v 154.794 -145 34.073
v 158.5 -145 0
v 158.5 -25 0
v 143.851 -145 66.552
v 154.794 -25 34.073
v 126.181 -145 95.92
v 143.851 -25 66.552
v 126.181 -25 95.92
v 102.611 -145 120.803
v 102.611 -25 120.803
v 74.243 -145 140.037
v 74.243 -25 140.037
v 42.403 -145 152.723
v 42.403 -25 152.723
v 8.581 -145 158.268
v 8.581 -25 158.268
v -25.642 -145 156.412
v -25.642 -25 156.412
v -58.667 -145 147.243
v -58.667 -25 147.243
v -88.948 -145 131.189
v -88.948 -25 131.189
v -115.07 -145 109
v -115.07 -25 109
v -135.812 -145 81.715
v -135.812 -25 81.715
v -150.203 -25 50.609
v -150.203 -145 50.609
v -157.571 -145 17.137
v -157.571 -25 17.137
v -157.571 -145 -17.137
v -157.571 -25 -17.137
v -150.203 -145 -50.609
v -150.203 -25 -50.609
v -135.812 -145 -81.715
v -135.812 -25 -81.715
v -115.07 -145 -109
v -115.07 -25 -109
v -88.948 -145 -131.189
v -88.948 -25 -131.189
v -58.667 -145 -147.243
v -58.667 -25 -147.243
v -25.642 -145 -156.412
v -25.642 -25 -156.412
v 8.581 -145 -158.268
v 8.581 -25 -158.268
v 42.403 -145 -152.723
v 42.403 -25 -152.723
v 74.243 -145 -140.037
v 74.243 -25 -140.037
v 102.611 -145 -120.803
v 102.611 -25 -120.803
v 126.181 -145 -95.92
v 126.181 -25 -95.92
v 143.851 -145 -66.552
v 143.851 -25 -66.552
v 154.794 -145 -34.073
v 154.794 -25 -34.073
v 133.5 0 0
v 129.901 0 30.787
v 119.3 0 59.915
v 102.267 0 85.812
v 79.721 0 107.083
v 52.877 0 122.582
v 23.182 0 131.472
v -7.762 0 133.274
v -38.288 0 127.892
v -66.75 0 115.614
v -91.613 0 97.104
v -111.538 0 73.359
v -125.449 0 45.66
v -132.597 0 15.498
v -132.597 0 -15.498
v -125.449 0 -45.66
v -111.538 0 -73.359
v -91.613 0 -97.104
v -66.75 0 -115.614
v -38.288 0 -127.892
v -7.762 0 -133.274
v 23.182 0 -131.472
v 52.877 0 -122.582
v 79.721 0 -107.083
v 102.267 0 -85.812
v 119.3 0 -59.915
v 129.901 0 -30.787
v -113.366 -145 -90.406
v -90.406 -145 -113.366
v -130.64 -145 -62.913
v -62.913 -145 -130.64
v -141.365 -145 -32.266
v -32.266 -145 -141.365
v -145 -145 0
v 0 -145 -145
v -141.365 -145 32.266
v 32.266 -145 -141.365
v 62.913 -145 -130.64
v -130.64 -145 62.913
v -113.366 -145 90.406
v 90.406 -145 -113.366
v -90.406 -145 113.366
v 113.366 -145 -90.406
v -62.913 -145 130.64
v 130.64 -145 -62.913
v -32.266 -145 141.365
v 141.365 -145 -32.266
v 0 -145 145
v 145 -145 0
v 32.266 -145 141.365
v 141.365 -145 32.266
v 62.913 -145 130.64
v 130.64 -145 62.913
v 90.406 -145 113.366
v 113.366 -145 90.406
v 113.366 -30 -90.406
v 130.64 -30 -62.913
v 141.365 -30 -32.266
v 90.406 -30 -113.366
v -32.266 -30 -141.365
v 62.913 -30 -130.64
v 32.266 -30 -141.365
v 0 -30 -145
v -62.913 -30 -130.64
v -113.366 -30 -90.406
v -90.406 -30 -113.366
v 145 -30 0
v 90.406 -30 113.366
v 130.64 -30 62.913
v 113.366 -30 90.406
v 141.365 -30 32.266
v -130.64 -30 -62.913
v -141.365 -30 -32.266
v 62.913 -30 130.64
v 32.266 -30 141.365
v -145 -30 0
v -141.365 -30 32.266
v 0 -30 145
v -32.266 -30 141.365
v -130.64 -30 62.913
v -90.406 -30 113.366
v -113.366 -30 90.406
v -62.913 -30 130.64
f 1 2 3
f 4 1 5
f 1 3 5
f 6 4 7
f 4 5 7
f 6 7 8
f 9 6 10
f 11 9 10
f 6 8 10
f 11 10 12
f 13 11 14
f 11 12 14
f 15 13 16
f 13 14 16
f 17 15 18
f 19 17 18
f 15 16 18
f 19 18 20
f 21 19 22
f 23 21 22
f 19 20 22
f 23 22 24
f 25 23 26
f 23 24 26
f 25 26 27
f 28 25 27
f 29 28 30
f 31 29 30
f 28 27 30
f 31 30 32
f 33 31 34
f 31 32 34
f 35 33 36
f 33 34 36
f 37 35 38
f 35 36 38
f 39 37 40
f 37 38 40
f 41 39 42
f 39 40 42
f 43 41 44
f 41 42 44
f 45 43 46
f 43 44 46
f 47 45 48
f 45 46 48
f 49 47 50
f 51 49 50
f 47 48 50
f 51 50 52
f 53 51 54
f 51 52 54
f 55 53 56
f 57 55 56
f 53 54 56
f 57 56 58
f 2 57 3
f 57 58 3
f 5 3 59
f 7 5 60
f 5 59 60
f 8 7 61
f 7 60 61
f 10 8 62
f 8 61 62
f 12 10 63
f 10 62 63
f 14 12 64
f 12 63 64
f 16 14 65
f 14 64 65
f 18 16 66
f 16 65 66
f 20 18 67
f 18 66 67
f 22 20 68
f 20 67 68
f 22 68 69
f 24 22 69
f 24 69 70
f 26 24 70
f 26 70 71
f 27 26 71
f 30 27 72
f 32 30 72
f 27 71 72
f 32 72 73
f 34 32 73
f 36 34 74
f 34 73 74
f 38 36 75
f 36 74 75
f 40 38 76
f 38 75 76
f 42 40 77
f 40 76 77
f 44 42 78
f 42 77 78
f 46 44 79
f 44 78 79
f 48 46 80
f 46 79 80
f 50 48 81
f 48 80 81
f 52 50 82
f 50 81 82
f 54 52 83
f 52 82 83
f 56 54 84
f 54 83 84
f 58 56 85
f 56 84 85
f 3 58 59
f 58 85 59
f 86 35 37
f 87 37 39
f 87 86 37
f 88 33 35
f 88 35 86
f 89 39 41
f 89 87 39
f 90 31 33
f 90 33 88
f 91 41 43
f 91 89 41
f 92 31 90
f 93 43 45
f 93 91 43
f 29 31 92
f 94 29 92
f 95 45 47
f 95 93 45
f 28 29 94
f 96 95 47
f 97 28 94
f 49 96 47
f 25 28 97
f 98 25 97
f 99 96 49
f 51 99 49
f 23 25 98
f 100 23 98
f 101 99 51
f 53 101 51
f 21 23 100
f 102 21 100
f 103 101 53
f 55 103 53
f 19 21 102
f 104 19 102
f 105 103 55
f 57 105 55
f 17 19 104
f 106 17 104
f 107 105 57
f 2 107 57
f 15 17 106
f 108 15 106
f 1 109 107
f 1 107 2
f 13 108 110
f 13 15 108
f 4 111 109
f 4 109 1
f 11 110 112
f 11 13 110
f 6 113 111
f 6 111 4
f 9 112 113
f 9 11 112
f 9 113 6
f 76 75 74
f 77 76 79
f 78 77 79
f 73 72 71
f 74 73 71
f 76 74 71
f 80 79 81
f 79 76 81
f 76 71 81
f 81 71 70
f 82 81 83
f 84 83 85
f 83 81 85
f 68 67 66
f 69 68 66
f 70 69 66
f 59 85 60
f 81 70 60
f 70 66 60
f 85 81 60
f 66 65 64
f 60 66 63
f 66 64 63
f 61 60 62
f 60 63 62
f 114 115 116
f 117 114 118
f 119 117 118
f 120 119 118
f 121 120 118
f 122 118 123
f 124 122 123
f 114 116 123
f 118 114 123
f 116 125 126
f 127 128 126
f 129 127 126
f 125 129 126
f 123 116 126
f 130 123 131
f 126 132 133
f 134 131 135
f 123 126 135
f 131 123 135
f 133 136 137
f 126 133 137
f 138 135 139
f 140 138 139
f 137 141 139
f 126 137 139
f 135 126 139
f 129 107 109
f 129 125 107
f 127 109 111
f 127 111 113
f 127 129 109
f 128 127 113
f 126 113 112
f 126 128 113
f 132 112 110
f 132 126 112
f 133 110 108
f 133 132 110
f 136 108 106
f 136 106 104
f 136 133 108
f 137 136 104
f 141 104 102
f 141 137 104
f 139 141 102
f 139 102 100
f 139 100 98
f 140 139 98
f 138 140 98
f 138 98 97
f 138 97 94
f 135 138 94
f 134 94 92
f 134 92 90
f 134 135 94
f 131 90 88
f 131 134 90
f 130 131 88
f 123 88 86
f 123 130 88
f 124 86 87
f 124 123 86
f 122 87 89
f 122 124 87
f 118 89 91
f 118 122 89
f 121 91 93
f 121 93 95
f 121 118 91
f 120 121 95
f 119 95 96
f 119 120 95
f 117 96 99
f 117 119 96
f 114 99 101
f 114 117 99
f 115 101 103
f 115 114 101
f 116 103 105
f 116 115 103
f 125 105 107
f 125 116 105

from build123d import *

# Parameters (mm, degrees)
F0_R     = 158.5
F0_R_2   = 145
F1_DEPTH = 125
F2_R     = 158.5
F3_DEPTH = 30
F4_SIZE  = 25
F5_DEPTH = 20


with BuildPart() as f1:
    # F0 (on Front) → F1 (new body)
    with BuildSketch(Plane.XZ):
        Circle(F0_R)
        Circle(F0_R_2, mode=Mode.SUBTRACT)
    extrude(amount=F1_DEPTH)

    # F2 (on face) → F3 (join)
    with BuildSketch(Plane(origin=(0, 0, 0), x_dir=(-1, 0, 0), z_dir=(0, 1, 0))):
        Circle(F2_R)
    extrude(amount=-F3_DEPTH)

    # F4
    f4_edges = [f1.edges().sort_by_distance(p)[0] for p in [
        (-158.5, 0, 0),
    ]]
    chamfer(f4_edges, length=F4_SIZE)

    # F5 (add): a face of the model
    f5_faces = [f1.faces().sort_by_distance(p)[0] for p in [
        (-154.0169430073, -125, 0),
    ]]
    extrude(f5_faces, amount=F5_DEPTH)


solid = f1.part
